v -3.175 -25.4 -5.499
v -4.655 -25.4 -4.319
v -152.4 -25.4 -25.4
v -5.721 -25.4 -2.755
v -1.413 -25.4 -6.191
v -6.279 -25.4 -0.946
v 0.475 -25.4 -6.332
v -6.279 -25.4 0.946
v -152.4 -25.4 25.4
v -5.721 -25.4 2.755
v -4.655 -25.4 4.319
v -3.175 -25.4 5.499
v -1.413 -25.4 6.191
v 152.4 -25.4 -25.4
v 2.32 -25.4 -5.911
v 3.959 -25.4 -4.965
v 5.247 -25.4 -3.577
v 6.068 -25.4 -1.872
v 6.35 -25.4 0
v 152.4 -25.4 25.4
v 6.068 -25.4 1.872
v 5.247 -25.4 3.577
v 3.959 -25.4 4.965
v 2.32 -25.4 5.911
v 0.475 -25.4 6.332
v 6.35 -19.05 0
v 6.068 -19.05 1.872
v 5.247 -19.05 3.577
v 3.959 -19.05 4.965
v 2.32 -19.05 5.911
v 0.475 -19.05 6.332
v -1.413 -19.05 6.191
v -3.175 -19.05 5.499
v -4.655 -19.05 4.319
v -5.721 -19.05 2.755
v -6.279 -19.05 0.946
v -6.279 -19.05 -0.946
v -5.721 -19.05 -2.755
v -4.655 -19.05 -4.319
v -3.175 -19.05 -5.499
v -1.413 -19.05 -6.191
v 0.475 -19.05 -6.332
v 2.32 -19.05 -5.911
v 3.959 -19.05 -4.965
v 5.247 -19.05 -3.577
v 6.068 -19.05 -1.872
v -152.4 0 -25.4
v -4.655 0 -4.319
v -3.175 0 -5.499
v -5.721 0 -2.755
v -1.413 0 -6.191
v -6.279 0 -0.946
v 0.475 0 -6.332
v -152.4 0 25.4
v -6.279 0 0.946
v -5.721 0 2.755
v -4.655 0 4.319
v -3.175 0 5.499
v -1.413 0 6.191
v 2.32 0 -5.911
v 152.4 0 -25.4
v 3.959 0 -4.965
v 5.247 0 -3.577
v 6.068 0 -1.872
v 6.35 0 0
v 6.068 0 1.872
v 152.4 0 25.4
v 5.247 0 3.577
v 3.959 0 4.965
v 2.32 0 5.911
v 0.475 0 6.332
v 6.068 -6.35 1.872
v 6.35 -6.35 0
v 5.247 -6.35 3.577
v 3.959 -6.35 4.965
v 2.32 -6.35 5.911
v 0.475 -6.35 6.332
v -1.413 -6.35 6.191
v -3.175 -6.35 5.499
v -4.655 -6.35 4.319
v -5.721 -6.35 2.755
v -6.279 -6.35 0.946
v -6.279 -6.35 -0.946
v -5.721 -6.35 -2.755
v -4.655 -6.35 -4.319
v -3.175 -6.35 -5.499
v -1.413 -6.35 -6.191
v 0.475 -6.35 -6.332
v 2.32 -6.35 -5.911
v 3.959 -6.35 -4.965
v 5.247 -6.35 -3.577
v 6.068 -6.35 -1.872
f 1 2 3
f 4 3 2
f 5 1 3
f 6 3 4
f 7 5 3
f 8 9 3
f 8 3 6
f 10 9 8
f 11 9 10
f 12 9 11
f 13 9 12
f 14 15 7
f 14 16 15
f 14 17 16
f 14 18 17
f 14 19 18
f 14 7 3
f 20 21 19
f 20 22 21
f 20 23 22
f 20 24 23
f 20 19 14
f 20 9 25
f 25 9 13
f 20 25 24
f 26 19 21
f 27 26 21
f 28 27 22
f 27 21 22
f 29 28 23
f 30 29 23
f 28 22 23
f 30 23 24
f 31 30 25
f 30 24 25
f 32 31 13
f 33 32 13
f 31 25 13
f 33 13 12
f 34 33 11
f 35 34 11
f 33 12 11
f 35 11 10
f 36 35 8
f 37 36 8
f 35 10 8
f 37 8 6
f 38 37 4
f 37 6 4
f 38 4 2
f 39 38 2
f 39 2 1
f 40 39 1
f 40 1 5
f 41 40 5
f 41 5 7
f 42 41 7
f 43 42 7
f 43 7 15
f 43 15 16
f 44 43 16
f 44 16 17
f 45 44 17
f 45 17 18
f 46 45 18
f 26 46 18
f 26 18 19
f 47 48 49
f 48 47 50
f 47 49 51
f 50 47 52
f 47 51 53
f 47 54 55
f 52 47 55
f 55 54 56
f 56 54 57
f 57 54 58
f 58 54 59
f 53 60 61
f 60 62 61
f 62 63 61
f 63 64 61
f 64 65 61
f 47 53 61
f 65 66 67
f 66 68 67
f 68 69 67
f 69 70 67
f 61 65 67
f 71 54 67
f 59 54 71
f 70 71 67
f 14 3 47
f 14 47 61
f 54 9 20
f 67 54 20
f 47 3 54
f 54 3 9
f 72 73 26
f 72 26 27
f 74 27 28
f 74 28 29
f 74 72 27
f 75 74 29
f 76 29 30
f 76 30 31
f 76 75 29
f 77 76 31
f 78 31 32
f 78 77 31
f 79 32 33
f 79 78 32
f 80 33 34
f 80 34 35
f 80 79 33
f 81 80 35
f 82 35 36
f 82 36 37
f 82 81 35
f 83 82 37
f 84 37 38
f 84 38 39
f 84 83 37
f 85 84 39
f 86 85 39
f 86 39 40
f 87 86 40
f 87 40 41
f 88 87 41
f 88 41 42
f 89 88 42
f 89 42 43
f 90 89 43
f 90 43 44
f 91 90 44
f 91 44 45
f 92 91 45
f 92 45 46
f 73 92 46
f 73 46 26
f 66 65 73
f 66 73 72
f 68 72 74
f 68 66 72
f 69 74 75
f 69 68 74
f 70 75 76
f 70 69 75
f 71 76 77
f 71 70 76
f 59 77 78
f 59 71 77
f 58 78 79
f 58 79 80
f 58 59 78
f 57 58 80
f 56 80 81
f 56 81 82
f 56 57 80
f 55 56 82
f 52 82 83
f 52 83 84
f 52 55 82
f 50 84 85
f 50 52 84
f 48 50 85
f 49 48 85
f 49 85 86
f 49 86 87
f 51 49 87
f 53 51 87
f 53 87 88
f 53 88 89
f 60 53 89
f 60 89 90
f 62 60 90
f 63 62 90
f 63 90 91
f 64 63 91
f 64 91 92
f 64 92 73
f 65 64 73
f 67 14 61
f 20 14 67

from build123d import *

# Parameters (mm, degrees)
F0_W     = 304.8
F0_H     = 50.8
F0_R     = 6.35
F1_DEPTH = 19.05


# Not quite as in the source:
# - a pattern or mirror of a feature is missing from the dataset's text; its kind, count and spacing are read off the source's solid


with BuildPart() as f1:
    # F0 (on Front) → F1 (new body)
    with BuildSketch(Plane.XZ):
        Rectangle(F0_W, F0_H)
        Circle(F0_R, mode=Mode.SUBTRACT)
    extrude(amount=F1_DEPTH)

    # F1_copies: F1 across plane


with BuildPart() as f1_1:
    add(f1.part)
    add(f1.part.mirror(Plane(origin=(0, -12.7, 0), x_dir=(0, 0, -1), z_dir=(0, -1, 0))))


solid = f1_1.part
